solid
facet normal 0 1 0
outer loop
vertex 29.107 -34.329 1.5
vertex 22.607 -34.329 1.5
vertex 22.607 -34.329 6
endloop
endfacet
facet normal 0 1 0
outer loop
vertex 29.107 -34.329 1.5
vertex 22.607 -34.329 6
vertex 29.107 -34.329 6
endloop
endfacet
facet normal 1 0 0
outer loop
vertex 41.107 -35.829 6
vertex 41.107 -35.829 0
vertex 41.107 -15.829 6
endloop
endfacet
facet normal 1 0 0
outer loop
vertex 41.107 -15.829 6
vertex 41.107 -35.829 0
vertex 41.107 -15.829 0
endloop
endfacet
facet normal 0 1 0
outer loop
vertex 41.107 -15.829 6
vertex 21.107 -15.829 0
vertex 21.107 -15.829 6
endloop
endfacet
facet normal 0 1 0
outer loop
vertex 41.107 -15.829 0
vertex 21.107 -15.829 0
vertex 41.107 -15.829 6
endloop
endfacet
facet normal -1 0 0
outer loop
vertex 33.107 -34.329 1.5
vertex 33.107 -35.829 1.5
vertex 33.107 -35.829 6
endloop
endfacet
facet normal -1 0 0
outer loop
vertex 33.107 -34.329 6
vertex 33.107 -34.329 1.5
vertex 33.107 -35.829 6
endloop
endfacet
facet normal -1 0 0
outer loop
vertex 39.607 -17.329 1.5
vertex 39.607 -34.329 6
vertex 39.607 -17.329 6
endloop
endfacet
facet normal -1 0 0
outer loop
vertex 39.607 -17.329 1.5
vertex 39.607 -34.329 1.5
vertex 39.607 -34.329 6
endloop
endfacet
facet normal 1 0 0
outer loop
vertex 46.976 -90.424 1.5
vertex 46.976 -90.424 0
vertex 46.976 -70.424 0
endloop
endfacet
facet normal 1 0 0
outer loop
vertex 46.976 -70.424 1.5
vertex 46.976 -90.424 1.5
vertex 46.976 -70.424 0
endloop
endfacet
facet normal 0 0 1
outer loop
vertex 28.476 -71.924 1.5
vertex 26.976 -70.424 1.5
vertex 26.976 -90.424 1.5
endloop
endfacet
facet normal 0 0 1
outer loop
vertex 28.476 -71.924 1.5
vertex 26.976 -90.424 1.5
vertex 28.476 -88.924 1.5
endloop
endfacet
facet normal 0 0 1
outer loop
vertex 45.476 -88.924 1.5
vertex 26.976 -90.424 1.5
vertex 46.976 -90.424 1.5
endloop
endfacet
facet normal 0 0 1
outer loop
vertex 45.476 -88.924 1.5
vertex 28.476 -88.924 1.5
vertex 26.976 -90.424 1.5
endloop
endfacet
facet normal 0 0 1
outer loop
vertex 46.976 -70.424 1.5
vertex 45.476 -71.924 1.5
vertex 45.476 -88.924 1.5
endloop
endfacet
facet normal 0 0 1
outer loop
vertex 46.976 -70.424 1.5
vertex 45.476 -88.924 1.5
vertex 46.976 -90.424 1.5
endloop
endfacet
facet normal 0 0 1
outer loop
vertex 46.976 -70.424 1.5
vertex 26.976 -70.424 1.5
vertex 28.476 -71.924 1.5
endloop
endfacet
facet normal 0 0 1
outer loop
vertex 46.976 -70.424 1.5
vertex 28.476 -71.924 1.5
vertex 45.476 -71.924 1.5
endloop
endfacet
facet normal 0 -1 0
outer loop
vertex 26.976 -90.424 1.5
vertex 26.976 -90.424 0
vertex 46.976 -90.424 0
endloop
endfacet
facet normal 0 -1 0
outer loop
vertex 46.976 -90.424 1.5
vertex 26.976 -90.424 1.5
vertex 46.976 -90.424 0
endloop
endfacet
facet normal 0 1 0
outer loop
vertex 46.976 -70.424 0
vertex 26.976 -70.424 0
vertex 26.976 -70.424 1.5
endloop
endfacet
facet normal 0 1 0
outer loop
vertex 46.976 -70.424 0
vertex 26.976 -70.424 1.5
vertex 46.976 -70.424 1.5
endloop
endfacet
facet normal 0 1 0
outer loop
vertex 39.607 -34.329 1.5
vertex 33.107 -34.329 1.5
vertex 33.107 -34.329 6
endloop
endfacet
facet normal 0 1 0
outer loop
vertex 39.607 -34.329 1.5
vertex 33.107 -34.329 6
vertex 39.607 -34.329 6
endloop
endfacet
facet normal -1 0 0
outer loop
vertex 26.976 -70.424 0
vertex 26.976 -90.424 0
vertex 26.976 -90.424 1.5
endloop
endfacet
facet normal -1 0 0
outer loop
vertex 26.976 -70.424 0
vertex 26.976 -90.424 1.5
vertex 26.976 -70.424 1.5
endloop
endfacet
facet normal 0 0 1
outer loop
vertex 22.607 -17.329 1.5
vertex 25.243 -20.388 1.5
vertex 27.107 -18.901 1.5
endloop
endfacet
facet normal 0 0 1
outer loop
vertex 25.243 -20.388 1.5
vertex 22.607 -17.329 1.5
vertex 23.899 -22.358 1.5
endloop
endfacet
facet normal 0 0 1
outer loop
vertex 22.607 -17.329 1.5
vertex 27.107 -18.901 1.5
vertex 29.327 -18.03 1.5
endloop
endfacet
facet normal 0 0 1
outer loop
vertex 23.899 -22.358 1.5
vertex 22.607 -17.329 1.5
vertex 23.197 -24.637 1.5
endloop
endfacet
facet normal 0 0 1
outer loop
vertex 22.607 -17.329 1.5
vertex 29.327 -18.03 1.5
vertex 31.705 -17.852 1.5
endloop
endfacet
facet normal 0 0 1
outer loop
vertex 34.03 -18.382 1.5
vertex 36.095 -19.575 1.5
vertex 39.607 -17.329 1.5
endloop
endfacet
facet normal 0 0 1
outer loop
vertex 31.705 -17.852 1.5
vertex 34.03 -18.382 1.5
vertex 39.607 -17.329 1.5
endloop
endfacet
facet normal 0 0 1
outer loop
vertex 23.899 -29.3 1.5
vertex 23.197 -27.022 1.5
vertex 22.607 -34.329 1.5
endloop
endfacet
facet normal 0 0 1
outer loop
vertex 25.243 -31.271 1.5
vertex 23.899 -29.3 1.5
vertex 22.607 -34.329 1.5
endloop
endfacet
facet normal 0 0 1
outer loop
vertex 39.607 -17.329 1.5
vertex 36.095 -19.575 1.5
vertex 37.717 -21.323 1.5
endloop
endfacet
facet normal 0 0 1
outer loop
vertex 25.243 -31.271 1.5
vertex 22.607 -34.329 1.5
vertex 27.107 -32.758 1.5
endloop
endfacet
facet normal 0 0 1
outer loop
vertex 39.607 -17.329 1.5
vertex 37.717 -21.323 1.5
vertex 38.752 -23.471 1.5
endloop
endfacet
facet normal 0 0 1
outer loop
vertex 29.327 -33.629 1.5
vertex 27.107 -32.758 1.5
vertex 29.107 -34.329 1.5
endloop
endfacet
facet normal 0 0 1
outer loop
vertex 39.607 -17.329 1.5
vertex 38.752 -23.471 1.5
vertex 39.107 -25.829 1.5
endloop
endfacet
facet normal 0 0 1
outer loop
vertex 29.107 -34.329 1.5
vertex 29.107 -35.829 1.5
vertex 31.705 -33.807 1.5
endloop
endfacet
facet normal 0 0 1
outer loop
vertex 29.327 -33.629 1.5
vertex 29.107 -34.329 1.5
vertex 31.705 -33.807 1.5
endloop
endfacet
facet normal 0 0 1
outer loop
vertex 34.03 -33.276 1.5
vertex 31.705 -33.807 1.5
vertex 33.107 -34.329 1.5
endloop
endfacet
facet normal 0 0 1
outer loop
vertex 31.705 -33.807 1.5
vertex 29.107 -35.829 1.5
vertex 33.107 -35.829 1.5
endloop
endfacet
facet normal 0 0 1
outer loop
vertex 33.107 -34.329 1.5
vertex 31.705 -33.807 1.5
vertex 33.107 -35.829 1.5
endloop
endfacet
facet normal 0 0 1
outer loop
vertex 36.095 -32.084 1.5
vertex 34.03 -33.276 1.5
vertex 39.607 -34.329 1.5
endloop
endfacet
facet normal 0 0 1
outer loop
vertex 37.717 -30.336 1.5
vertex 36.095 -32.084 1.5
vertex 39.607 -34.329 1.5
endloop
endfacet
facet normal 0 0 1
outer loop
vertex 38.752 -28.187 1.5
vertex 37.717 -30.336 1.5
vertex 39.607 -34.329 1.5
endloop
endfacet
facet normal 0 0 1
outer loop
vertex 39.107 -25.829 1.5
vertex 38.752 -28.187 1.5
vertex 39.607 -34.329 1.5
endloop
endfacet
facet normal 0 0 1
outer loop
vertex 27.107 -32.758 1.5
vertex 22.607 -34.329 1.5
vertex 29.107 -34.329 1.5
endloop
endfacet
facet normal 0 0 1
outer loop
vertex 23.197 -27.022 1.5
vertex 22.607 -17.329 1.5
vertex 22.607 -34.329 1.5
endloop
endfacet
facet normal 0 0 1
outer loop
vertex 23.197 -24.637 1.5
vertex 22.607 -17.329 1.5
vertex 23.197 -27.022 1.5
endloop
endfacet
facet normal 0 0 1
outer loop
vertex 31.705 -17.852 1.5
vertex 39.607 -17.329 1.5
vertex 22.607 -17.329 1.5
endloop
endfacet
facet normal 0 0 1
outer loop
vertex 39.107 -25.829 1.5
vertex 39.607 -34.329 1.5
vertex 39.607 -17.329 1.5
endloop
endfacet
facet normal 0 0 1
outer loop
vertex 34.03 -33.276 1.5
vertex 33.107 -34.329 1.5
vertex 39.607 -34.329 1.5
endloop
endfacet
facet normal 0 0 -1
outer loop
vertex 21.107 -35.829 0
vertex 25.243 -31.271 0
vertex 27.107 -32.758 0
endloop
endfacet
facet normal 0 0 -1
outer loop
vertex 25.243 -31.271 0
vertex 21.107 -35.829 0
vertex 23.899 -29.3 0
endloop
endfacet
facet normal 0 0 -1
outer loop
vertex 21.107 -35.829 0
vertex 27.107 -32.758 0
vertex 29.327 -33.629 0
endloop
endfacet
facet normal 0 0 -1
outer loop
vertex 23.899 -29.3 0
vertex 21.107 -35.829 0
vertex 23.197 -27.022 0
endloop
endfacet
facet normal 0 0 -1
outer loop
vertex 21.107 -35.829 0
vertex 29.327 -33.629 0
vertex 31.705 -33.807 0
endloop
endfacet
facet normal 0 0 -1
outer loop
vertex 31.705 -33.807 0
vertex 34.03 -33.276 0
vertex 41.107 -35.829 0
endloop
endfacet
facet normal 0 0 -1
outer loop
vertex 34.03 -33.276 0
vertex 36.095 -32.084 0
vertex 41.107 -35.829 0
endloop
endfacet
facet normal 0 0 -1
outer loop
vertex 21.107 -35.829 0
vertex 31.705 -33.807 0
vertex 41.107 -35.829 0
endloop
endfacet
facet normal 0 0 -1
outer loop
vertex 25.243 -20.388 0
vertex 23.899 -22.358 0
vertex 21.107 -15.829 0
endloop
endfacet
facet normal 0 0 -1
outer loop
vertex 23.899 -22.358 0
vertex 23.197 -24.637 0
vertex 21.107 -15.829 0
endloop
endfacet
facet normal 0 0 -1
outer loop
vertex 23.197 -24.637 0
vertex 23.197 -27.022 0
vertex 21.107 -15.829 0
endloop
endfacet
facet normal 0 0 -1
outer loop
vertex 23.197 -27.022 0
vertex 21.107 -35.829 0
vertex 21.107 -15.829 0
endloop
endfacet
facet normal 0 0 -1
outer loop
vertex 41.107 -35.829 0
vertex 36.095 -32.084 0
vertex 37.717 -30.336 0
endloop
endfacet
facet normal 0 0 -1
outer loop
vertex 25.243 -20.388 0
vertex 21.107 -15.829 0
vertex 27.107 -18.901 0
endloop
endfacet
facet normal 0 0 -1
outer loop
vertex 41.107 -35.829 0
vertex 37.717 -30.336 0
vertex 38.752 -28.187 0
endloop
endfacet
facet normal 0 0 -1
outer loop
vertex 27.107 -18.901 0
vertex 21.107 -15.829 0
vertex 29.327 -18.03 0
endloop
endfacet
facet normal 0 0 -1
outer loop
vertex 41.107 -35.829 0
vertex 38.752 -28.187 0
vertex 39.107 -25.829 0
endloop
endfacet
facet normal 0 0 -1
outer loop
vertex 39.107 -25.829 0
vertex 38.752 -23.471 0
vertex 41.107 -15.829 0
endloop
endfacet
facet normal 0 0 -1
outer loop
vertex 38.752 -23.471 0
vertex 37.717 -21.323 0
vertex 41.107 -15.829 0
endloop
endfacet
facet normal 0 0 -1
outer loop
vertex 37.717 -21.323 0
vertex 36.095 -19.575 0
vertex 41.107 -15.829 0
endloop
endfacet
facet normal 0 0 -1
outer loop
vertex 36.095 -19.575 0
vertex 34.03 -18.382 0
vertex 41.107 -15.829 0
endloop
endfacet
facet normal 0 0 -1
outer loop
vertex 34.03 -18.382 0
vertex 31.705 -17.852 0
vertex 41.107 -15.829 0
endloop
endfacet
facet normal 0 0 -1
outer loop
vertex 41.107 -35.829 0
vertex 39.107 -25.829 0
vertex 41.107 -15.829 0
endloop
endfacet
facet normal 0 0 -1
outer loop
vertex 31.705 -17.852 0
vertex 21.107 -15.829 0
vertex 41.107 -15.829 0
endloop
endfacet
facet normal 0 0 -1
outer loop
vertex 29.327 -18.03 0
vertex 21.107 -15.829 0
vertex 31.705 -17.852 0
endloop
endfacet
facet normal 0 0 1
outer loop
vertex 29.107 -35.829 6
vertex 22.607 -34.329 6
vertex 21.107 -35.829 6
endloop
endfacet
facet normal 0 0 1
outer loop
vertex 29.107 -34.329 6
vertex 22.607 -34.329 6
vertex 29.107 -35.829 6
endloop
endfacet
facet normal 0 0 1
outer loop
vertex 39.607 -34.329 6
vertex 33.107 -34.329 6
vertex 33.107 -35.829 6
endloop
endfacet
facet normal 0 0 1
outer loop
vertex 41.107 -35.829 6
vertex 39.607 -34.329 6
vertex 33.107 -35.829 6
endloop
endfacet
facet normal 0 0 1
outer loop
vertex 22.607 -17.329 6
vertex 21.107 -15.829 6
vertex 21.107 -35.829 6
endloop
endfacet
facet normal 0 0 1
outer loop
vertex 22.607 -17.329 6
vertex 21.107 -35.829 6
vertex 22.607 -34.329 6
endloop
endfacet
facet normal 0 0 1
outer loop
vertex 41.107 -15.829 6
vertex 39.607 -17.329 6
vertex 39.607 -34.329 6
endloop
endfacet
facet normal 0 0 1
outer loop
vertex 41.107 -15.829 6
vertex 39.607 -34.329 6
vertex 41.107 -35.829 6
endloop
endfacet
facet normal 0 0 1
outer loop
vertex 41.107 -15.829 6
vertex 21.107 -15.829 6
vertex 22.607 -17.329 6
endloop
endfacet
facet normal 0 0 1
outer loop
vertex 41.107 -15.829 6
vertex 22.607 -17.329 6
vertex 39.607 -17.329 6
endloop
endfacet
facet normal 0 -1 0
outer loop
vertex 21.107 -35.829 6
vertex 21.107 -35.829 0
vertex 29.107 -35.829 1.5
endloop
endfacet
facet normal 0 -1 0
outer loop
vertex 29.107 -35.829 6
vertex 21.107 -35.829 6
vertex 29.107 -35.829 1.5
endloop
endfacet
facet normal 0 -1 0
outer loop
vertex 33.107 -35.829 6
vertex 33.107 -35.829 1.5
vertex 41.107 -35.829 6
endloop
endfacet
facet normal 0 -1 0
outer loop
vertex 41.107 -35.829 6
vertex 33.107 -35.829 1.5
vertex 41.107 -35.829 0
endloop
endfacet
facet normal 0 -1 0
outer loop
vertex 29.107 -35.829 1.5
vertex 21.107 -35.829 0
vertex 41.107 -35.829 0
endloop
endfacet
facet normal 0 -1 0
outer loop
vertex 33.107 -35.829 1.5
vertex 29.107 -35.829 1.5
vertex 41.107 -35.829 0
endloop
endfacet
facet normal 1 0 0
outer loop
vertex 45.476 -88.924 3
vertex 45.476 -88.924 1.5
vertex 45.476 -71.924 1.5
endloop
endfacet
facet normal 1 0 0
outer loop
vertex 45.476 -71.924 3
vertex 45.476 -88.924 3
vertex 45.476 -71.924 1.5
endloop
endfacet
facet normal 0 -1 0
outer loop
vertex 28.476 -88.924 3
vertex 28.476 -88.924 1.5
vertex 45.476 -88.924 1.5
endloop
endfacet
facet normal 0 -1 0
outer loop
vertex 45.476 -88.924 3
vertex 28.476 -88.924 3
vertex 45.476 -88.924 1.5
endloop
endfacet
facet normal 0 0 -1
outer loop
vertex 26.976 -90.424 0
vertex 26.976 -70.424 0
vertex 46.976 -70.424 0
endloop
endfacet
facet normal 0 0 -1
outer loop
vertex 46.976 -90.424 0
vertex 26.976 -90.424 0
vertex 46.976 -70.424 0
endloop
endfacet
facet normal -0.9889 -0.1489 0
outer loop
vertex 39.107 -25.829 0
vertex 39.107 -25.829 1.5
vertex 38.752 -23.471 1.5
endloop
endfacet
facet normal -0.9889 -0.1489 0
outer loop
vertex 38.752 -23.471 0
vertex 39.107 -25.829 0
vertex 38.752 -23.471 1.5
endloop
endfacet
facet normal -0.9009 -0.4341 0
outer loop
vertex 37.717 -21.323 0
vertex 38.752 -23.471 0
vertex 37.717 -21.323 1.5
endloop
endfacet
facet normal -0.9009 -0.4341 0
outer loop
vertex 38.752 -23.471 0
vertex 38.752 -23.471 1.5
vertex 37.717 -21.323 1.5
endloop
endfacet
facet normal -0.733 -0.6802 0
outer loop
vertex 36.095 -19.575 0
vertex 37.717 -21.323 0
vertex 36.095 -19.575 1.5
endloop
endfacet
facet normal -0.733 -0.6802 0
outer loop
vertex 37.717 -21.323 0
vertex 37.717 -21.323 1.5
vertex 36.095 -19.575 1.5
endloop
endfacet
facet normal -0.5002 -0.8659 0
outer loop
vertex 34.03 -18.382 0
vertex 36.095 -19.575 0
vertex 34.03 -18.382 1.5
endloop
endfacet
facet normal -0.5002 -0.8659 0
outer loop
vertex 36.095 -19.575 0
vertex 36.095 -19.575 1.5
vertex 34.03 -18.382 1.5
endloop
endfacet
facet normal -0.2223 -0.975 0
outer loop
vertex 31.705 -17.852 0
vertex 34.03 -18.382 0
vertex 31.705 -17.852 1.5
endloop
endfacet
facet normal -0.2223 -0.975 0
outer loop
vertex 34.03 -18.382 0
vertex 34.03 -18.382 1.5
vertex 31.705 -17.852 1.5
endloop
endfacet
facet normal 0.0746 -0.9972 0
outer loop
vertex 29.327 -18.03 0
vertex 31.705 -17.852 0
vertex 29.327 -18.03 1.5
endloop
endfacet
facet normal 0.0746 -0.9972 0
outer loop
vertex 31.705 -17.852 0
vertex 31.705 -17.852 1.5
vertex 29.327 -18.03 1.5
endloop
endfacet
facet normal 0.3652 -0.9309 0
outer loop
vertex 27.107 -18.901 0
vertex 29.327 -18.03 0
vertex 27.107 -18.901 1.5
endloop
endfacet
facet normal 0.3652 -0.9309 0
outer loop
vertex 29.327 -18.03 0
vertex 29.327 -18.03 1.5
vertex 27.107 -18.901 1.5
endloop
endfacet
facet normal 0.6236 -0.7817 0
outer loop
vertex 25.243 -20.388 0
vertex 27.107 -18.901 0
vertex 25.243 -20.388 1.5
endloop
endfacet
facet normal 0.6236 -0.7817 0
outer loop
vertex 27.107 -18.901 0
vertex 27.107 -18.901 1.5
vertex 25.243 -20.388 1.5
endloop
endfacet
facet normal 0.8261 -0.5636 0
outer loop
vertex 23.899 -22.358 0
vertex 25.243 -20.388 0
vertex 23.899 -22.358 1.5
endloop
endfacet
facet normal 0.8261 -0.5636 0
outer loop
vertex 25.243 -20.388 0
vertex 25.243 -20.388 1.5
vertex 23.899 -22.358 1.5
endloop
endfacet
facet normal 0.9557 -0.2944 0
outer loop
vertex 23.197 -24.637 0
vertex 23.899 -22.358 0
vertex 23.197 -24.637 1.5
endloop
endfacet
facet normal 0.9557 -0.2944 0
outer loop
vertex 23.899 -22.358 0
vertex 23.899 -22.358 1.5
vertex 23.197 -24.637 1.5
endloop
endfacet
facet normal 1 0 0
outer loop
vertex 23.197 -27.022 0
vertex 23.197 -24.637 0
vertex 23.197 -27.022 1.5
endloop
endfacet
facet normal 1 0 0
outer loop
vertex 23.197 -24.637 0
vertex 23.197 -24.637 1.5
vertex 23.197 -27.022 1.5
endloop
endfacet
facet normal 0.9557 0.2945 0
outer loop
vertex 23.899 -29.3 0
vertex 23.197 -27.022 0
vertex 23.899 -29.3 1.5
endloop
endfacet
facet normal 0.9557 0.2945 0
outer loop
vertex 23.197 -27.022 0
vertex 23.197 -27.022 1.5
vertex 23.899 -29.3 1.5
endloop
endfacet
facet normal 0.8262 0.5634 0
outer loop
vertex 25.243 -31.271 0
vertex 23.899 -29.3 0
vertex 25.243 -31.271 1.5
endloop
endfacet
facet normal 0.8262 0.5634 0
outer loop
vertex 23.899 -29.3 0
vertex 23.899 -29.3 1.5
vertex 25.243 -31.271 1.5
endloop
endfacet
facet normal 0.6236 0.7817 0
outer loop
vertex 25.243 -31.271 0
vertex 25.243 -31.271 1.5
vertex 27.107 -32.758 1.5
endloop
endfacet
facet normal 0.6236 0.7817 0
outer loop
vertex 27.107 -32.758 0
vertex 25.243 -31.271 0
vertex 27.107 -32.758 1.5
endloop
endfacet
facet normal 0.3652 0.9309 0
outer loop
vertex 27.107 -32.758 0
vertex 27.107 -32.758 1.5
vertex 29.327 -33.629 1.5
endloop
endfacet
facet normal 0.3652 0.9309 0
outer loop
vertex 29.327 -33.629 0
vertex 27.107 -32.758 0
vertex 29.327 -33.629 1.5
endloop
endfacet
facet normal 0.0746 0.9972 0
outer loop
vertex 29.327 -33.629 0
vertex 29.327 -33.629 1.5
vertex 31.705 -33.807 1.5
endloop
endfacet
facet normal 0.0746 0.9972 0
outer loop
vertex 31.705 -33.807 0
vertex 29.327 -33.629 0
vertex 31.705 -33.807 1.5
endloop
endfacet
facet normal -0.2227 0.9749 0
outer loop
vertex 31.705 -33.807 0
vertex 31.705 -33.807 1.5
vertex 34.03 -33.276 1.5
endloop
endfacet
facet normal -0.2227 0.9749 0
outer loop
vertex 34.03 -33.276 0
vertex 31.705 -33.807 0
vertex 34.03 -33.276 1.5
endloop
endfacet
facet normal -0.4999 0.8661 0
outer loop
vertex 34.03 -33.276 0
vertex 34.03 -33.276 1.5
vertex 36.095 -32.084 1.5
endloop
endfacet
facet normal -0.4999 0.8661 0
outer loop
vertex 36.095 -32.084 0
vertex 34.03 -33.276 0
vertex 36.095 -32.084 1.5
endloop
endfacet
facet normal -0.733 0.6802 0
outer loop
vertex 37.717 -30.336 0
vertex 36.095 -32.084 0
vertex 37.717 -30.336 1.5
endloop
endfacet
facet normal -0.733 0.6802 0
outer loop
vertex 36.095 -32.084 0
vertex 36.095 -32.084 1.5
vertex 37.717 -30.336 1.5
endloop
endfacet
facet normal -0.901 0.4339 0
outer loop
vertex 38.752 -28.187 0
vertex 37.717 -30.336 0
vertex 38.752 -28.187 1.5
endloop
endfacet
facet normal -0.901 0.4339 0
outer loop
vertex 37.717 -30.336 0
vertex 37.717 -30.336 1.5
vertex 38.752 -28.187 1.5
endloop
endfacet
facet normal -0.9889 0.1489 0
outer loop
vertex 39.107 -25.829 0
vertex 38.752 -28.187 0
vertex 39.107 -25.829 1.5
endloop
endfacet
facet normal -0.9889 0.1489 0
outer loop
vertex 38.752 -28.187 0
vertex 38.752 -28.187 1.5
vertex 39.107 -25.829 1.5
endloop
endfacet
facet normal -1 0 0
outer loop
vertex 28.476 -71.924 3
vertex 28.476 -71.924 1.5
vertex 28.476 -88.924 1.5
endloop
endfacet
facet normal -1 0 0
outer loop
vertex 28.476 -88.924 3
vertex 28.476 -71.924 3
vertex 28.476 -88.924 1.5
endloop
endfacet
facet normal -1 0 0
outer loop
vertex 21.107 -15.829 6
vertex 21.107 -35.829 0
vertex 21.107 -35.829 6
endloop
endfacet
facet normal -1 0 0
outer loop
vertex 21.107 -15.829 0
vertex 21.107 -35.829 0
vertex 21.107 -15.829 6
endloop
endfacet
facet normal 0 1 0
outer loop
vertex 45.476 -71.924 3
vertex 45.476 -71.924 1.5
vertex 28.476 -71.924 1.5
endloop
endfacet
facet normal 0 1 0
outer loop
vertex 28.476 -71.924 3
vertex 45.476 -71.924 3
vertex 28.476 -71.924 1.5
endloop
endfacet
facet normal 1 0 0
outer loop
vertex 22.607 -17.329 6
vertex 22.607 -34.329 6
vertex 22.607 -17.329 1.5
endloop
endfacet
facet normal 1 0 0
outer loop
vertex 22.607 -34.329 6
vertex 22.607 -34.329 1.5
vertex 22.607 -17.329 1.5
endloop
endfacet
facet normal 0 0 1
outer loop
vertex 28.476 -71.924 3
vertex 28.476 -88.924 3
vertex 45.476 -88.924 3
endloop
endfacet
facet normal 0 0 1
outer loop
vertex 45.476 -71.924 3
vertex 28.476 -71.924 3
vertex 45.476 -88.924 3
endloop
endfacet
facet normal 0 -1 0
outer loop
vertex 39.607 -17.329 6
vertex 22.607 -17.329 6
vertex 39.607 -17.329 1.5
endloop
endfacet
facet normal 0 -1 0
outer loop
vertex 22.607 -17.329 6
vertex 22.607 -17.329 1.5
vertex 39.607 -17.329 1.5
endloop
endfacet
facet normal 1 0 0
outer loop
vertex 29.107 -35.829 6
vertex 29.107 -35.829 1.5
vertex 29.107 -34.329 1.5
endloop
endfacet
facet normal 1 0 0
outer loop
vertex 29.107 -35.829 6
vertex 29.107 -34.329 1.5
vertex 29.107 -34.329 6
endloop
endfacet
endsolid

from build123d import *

# Parameters (mm, degrees)
F0_W     = 20
F0_H     = 20
F1_DEPTH = 6
F2_T     = -1.5
F3_R     = 8
F4_DEPTH = 1.5
F5_DEPTH = 1.5
F6_DEPTH = 3
F7_W     = 4
F7_H     = 4.5
F8_DEPTH = 1.5


with BuildPart() as f1:
    # F0 (on Top) → F1 (new body)
    with BuildSketch(Plane.XY):
        with Locations((31.10723, -25.829384)):
            Rectangle(F0_W, F0_H)
    extrude(amount=F1_DEPTH)

    # F2
    f2_openings = [f1.faces().sort_by_distance(p)[0] for p in [
        (31.10723, -25.829384, 6),
    ]]
    offset(amount=F2_T, openings=f2_openings)

    # F3 (on face) → F4 (cut, through all)
    with BuildSketch(Plane.XY.offset(1.5)):
        with Locations((31.10723, -25.829384)):
            Circle(F3_R)
    extrude(amount=-F4_DEPTH, mode=Mode.SUBTRACT)

    # F7 (on face) → F8 (cut, through all)
    with BuildSketch(Plane.XZ.offset(35.829384)):
        with Locations((31.10723, 3.75)):
            Rectangle(F7_W, F7_H)
    extrude(amount=-F8_DEPTH, mode=Mode.SUBTRACT)


with BuildPart() as f5:
    # F0 (on Top) → F5 (new body)
    with BuildSketch(Plane.XY):
        with Locations((36.975507, -80.423949)):
            Rectangle(F0_W, F0_H)
        Polygon((28.475507, -71.923949), (45.475507, -71.923949), (45.475507, -88.923949), (28.475507, -88.923949), (28.475507, -83.923949), align=None, mode=Mode.SUBTRACT)
        Polygon((45.475507, -88.923949), (45.475507, -71.923949), (28.475507, -71.923949), (28.475507, -83.923949), (28.475507, -88.923949), align=None)
    extrude(amount=F5_DEPTH)

    # F0 (on Top) → F6 (join)
    with BuildSketch(Plane.XY):
        Polygon((45.475507, -88.923949), (45.475507, -71.923949), (28.475507, -71.923949), (28.475507, -83.923949), (28.475507, -88.923949), align=None)
    extrude(amount=F6_DEPTH)


solid = Compound([f1.part, f5.part])
